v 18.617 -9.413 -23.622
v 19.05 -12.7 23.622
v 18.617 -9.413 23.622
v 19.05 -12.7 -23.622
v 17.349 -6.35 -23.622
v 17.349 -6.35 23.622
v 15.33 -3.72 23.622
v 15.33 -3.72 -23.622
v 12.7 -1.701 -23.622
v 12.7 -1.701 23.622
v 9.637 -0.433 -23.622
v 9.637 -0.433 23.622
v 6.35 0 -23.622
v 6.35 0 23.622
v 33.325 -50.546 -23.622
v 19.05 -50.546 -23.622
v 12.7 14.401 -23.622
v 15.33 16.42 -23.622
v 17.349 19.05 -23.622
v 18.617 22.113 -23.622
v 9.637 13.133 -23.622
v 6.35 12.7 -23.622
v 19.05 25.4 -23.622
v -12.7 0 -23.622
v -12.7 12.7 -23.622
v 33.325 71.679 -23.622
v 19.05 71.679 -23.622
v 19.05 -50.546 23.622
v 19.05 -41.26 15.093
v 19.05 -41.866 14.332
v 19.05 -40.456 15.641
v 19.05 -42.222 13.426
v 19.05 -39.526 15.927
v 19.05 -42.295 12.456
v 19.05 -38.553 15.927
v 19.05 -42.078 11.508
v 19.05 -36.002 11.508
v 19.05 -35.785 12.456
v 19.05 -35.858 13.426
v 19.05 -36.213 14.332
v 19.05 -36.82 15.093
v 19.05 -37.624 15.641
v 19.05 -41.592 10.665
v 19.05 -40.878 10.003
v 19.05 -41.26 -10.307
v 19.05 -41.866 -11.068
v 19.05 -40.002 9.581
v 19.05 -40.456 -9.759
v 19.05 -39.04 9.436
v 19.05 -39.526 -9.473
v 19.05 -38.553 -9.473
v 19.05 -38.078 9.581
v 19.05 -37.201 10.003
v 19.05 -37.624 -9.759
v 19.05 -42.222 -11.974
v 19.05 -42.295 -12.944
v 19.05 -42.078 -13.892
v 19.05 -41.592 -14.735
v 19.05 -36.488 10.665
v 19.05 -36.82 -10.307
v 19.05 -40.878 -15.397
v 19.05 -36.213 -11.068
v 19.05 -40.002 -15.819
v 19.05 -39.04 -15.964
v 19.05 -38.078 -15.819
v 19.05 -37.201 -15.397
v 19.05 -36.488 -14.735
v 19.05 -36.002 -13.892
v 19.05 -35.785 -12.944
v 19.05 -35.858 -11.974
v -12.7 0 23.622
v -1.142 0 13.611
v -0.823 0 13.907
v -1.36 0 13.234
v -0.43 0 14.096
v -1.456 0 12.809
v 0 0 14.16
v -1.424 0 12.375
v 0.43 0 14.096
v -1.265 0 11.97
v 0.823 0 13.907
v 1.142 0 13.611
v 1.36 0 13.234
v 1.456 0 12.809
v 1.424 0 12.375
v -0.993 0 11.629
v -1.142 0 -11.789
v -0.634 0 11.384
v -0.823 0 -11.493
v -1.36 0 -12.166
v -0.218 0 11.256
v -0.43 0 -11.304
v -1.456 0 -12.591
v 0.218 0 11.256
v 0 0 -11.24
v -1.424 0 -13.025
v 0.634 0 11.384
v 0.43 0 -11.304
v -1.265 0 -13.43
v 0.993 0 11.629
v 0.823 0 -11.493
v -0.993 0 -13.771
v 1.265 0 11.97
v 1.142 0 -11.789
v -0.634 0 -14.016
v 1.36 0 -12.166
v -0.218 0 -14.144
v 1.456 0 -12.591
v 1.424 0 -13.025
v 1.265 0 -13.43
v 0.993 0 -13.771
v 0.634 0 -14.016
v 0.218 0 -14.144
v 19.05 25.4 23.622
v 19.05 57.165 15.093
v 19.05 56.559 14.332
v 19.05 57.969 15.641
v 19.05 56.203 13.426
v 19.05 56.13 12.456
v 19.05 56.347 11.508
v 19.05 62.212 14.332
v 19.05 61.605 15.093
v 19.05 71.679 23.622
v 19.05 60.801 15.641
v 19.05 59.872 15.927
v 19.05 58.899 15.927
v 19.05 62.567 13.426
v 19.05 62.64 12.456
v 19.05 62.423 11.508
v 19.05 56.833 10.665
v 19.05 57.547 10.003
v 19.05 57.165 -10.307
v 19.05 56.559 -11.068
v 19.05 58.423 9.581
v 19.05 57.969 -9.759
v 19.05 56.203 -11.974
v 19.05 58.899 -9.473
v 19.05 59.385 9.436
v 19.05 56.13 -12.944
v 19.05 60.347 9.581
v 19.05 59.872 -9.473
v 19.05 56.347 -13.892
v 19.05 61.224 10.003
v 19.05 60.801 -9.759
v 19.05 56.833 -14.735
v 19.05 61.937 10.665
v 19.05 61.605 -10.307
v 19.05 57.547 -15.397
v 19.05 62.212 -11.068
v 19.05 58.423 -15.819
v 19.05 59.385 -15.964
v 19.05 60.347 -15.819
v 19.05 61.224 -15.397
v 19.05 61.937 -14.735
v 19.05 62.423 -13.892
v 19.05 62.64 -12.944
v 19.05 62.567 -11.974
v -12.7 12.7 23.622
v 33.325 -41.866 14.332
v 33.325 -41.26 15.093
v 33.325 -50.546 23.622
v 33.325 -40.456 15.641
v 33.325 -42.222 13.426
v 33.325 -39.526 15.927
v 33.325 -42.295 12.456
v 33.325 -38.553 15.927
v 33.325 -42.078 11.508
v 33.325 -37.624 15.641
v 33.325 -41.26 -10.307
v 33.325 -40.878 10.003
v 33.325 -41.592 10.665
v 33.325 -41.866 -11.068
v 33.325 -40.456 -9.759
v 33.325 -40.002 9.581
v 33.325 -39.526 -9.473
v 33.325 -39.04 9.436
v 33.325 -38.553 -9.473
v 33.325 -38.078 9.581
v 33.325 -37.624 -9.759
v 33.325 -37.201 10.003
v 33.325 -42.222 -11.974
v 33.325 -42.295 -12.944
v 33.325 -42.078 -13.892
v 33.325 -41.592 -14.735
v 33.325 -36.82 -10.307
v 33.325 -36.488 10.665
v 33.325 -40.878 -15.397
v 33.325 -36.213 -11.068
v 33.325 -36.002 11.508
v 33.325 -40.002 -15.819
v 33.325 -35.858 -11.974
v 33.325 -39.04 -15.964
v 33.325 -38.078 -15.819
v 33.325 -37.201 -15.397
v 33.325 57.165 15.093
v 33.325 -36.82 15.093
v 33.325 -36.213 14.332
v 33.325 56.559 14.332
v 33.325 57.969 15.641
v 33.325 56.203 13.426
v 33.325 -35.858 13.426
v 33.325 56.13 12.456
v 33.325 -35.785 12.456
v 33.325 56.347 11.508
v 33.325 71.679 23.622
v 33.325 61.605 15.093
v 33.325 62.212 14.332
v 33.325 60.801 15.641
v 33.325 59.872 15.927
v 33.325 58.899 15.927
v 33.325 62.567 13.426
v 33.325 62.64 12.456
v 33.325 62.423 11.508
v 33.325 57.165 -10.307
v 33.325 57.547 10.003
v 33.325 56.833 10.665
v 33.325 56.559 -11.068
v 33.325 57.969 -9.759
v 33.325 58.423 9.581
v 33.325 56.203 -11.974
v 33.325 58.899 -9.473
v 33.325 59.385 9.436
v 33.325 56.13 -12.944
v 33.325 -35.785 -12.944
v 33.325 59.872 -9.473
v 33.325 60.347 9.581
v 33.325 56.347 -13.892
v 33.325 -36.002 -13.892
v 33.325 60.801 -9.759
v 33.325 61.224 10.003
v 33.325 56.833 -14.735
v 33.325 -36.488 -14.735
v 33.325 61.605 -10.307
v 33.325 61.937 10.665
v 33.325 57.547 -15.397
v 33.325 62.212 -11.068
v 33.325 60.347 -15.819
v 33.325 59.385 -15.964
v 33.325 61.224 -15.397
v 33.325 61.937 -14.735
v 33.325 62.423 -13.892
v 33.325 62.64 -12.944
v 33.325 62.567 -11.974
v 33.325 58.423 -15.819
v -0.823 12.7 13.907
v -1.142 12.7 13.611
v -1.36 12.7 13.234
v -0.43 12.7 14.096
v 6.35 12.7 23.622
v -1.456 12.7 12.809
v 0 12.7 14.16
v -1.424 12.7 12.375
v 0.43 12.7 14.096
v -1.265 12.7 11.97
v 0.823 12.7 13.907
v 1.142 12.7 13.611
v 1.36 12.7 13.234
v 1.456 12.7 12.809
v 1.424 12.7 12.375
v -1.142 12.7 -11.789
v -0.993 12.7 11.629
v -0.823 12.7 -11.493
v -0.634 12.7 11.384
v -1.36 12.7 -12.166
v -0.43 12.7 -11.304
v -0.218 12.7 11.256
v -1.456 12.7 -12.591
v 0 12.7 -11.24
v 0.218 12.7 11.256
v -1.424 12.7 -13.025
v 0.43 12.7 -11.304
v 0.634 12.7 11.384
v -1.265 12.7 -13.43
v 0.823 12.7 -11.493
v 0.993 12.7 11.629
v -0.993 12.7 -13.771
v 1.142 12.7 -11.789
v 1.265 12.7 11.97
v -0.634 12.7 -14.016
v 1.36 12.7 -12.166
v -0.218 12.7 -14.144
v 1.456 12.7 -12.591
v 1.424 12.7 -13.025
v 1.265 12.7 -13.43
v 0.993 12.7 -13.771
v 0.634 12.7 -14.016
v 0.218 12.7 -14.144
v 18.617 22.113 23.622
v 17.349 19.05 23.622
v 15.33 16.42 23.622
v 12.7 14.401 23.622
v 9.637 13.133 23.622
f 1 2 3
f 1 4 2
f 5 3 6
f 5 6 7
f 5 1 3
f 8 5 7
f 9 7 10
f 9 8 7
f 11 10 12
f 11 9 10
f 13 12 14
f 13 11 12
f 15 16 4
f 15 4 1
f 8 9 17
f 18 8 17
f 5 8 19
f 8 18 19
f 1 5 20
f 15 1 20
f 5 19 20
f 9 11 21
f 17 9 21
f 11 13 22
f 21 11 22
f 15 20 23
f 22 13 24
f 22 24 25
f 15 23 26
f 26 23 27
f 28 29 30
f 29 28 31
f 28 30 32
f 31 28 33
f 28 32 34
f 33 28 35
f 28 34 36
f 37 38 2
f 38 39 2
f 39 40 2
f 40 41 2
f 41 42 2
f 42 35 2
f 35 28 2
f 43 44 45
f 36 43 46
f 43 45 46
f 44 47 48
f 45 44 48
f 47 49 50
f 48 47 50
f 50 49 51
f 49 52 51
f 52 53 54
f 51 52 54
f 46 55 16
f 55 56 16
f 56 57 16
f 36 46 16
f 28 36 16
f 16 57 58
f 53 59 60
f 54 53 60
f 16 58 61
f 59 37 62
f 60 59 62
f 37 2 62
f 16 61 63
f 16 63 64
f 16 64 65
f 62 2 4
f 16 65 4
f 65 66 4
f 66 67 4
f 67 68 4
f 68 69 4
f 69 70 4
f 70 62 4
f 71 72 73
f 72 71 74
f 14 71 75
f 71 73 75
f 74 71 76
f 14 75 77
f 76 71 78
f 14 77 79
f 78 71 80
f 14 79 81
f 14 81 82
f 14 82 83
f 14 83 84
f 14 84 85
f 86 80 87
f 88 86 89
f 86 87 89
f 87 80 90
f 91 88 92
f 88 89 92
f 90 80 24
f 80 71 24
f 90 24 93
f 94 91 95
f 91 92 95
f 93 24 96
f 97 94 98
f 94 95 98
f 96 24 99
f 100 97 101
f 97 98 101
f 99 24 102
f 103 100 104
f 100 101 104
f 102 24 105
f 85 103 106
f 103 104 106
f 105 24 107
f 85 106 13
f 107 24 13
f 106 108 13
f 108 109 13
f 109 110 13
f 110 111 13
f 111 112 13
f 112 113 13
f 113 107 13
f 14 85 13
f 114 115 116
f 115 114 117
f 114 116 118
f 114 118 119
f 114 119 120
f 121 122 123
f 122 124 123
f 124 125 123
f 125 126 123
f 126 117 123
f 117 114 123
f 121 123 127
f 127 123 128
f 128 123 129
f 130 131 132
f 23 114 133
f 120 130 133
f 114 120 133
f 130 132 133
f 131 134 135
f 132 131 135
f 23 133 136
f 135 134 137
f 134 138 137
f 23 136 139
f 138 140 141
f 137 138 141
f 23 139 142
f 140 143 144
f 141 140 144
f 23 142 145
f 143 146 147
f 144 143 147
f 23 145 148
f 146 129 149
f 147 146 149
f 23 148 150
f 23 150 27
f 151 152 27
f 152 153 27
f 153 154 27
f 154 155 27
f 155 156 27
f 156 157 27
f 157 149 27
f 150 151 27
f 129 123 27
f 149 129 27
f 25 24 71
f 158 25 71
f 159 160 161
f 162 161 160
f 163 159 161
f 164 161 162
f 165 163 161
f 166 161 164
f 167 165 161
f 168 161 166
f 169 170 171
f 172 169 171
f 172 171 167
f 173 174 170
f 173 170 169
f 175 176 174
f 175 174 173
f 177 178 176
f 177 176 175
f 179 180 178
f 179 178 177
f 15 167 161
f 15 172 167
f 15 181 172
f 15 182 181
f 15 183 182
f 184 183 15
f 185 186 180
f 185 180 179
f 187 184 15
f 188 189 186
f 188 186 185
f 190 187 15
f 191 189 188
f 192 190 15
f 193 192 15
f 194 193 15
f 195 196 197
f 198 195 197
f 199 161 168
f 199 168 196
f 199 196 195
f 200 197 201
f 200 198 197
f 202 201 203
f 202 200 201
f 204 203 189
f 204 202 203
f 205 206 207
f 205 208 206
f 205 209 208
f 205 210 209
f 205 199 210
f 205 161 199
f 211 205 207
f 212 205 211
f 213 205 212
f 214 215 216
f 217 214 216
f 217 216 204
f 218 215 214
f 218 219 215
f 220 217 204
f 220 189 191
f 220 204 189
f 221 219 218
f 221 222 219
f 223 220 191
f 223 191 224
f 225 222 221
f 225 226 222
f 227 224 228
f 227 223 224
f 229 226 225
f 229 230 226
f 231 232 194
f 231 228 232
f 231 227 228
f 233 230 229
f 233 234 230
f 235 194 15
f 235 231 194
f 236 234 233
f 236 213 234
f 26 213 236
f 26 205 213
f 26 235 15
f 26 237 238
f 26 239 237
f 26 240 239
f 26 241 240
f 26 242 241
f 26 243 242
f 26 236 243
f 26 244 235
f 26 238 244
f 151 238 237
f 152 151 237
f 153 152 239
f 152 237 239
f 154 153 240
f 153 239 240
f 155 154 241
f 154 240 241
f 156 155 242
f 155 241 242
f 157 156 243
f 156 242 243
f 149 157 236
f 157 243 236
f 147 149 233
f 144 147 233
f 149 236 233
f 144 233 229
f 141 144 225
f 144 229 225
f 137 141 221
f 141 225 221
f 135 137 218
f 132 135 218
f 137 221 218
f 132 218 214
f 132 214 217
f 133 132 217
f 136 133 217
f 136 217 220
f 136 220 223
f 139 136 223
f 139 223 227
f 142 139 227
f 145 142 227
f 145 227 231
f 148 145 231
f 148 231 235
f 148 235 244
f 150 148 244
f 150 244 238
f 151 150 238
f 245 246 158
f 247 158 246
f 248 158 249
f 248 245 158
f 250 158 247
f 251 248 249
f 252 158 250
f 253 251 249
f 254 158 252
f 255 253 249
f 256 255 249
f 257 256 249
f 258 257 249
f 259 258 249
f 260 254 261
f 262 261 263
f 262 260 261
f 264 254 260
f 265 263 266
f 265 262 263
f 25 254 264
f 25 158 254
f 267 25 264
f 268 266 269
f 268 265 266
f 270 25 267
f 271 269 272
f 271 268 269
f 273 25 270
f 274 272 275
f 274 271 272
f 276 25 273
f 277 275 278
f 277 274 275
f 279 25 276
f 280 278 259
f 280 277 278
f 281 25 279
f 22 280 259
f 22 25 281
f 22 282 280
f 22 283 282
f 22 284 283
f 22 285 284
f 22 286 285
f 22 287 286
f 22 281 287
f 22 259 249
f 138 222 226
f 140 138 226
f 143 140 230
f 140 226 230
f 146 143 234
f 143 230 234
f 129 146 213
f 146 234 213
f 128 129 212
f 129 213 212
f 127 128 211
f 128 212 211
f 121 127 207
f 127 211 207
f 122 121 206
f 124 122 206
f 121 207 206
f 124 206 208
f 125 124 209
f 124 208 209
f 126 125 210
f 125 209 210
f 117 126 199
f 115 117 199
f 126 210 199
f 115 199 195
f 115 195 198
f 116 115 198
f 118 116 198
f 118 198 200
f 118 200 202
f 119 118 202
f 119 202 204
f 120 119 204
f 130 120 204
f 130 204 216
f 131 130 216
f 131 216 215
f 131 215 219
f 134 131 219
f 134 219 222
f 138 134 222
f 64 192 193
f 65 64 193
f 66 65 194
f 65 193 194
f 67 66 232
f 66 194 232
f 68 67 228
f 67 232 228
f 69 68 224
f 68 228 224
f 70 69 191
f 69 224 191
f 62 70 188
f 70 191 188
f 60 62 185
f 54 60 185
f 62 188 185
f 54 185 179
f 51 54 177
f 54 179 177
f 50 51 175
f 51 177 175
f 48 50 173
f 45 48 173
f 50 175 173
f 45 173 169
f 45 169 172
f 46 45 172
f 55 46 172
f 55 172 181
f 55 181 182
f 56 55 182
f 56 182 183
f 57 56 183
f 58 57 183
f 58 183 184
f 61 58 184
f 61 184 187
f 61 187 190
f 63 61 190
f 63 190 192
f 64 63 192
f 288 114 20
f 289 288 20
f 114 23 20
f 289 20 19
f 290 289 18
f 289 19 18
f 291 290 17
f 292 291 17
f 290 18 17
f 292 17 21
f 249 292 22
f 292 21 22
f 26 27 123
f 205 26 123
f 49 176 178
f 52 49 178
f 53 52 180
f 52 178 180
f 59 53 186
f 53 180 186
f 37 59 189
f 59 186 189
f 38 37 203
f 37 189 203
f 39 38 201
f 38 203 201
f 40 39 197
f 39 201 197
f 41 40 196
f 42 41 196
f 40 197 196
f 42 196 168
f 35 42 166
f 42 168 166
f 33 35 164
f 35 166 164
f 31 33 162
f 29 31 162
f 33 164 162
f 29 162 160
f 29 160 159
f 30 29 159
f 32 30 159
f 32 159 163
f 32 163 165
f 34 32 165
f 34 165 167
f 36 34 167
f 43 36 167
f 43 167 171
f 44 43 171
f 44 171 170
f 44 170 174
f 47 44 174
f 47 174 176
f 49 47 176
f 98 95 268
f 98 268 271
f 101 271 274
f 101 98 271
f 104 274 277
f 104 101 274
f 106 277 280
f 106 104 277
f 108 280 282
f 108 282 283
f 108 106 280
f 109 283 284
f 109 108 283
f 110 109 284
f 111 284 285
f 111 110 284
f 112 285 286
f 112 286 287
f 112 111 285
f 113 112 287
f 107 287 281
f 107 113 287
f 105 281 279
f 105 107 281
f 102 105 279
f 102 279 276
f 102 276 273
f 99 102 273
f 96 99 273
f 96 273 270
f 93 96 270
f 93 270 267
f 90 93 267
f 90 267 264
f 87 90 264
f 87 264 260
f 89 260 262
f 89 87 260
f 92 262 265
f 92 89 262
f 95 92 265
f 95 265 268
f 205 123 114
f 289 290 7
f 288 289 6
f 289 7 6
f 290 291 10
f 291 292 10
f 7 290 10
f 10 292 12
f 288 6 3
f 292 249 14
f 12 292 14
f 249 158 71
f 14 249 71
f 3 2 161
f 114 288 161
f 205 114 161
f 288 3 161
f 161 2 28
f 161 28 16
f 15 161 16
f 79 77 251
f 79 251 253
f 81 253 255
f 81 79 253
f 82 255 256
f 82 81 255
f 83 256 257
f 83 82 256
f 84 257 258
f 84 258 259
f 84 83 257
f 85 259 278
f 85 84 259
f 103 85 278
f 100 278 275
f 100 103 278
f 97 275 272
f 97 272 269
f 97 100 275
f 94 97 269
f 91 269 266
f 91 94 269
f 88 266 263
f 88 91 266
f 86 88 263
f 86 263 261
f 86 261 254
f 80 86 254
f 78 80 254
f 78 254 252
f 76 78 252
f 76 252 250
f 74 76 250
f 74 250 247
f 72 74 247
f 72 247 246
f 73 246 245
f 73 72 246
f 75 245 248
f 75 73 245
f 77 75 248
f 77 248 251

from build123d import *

# Parameters (mm, degrees)
SKETCH1_R           = 1.4605
BOSS_EXTRUDE1_DEPTH = 12.7
BOSS_EXTRUDE2_DEPTH = 14.2748
FILLET1_R           = 12.7
SKETCH3_R           = 3.2639
CUT_EXTRUDE1_DEPTH  = 89.397576146


with BuildPart() as part:
    # Sketch1 → Boss-Extrude1 (new body)
    with BuildSketch(Plane(origin=(0, 0, 0), x_dir=(1, 0, 0), z_dir=(0, 1, 0))):
        Polygon((-12.7, -23.622), (12.7, -23.622), (19.05, -23.622), (19.05, 23.622), (12.7, 23.622), (-12.7, 23.622), align=None)
        with Locations(Location((0, 12.7, 0), (0, 0, 270))):
            Circle(SKETCH1_R, mode=Mode.SUBTRACT)
        with Locations(Location((0, -12.7, 0), (0, 0, 270))):
            Circle(SKETCH1_R, mode=Mode.SUBTRACT)
    extrude(amount=BOSS_EXTRUDE1_DEPTH)

    # Sketch2 → Boss-Extrude2 (add)
    with BuildSketch(Plane(origin=(19.05, 0, 0), x_dir=(0, 0, -1), z_dir=(1, 0, 0))):
        Polygon((-23.622, 0), (-23.622, -50.546), (23.622, -50.546), (23.622, 71.6788), (-23.622, 71.6788), align=None)
    extrude(amount=BOSS_EXTRUDE2_DEPTH)

    # Fillet1
    fillet1_edges = [part.edges().sort_by_distance(p)[0] for p in [
        (19.05, 12.7, 0),
        (19.05, 0, 0),
    ]]
    fillet(fillet1_edges, radius=FILLET1_R)

    # Sketch3 → Cut-Extrude1 (cut, through all)
    with BuildSketch(Plane(origin=(33.3248, 0, 0), x_dir=(0, 0, -1), z_dir=(1, 0, 0))):
        with Locations((-12.7, -39.0398)):
            Circle(SKETCH3_R)
        with Locations((12.7, -39.0398)):
            Circle(SKETCH3_R)
        with Locations((-12.7, 59.3852)):
            Circle(SKETCH3_R)
        with Locations((12.7, 59.3852)):
            Circle(SKETCH3_R)
    extrude(amount=-CUT_EXTRUDE1_DEPTH, mode=Mode.SUBTRACT)


solid = part.part
